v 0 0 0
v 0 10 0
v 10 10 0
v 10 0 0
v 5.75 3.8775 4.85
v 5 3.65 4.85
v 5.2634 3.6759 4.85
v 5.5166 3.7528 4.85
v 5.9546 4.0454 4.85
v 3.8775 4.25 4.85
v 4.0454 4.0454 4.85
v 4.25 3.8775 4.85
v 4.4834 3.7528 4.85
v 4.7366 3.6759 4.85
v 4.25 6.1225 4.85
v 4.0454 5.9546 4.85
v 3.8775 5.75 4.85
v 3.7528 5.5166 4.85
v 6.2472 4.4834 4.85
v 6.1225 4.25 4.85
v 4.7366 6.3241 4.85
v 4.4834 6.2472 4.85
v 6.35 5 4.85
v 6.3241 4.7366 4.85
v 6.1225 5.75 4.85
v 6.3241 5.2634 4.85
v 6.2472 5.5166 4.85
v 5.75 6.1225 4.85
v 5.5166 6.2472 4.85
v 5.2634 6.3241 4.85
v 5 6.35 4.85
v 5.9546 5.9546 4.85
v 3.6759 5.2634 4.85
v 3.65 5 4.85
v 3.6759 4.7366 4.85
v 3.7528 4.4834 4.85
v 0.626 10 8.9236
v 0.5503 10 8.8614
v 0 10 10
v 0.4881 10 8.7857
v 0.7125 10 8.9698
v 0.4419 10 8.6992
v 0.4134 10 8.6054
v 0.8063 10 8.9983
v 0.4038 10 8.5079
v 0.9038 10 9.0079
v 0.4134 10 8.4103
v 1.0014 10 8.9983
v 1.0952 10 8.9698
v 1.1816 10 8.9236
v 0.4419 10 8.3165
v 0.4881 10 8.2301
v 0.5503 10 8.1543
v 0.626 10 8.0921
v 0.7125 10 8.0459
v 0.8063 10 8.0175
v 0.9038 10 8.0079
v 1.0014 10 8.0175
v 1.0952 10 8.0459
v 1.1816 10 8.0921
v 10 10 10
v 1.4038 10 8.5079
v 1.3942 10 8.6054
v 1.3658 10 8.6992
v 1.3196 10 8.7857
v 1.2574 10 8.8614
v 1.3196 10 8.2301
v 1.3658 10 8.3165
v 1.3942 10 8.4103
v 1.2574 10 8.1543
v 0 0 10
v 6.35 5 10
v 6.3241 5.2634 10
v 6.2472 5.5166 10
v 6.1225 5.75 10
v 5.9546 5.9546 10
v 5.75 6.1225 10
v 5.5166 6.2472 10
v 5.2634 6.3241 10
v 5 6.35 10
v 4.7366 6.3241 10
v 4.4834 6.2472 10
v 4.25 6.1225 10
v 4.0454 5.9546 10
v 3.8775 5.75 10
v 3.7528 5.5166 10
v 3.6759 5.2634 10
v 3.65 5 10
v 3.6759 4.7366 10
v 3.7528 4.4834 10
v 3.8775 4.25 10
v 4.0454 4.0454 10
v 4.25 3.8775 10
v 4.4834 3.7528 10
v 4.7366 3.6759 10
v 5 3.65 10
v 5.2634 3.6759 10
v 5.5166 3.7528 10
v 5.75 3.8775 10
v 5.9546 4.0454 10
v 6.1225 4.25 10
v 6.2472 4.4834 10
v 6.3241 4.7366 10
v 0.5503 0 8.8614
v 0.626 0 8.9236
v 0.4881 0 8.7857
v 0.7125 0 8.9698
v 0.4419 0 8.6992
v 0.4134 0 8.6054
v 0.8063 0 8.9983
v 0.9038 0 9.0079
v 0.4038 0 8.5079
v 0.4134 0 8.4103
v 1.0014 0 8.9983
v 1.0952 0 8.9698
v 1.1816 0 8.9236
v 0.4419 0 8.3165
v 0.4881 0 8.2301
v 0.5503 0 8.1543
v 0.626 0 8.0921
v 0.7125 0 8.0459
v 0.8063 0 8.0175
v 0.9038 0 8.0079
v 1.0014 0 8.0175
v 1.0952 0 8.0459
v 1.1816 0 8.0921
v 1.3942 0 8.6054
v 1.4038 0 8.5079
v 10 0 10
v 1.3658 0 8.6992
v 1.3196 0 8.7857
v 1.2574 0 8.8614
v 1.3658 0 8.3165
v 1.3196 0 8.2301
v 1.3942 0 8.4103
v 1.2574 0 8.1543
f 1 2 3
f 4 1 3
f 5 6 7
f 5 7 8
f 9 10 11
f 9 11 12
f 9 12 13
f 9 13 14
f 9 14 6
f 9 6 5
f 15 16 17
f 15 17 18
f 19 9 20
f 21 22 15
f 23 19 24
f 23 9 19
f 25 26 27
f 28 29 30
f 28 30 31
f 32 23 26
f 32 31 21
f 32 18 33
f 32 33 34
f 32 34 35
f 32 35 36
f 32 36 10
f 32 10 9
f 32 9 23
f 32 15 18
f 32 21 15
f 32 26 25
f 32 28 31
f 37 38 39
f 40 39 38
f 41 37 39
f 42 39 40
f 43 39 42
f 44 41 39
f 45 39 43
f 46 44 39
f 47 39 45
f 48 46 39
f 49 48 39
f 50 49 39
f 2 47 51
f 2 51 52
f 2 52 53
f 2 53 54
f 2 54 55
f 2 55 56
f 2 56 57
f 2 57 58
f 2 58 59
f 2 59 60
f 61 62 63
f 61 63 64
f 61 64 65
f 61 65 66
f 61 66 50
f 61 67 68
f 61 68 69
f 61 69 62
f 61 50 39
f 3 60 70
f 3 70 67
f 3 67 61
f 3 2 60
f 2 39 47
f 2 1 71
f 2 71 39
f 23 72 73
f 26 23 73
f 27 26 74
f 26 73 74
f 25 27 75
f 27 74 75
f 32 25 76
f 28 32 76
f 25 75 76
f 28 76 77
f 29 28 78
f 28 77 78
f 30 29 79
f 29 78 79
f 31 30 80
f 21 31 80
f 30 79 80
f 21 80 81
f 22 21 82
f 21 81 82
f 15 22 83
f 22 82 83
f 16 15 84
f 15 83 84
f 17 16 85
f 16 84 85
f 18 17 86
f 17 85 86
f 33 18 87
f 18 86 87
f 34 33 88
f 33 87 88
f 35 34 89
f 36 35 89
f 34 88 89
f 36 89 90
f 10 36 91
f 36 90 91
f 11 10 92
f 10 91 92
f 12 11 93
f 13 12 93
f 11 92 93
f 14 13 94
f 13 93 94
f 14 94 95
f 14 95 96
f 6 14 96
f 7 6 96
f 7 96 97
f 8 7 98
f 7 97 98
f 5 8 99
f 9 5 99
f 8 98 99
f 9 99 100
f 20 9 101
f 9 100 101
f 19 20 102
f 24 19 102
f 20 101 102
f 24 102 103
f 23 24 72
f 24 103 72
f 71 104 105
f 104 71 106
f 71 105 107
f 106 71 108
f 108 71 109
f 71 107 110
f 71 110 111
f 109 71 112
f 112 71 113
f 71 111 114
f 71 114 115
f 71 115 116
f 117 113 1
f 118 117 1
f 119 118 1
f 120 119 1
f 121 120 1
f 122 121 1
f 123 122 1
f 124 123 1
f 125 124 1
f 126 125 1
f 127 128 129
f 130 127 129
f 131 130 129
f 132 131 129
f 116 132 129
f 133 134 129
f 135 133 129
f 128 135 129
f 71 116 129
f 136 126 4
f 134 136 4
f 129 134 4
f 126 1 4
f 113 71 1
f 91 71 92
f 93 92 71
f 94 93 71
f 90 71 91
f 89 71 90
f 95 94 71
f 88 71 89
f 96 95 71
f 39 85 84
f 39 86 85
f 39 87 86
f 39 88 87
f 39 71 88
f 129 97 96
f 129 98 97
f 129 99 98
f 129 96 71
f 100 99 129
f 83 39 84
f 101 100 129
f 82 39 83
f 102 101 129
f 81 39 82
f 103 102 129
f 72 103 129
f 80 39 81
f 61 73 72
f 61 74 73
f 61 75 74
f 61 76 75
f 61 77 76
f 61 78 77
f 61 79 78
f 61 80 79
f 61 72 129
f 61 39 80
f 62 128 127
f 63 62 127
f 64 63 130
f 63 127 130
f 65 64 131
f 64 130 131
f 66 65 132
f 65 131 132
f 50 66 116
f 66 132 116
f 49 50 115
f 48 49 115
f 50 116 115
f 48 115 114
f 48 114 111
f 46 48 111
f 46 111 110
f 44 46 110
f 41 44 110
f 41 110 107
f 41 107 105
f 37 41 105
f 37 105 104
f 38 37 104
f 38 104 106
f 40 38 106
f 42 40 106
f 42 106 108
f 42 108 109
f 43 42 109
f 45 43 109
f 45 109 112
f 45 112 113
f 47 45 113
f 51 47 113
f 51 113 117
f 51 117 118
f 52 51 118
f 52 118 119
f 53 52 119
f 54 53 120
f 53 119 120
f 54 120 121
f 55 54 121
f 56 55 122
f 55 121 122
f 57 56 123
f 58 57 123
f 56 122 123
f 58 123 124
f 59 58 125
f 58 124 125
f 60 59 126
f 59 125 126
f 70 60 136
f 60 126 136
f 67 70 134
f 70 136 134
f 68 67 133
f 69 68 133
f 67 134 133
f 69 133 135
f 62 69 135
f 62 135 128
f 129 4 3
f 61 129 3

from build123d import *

# Parameters (mm, degrees)
F0_W     = 10
F0_H     = 10
F1_DEPTH = 10
F2_R     = 1.35
F3_DEPTH = 5.15
F4_R     = 0.5
F5_DEPTH = 10.001


with BuildPart() as f1:
    # F0 (on Top) → F1 (new body)
    with BuildSketch(Plane.XY):
        with Locations((5, 5)):
            Rectangle(F0_W, F0_H)
    extrude(amount=F1_DEPTH)

    # F2 (on face) → F3 (cut)
    with BuildSketch(Plane.XY.offset(10)):
        with Locations((5, 5)):
            Circle(F2_R)
    extrude(amount=-F3_DEPTH, mode=Mode.SUBTRACT)

    # F4 (on face) → F5 (cut, through all)
    with BuildSketch(Plane.XZ):
        with Locations((0.903822, 8.507882)):
            Circle(F4_R)
    extrude(amount=-F5_DEPTH, mode=Mode.SUBTRACT)


solid = f1.part
